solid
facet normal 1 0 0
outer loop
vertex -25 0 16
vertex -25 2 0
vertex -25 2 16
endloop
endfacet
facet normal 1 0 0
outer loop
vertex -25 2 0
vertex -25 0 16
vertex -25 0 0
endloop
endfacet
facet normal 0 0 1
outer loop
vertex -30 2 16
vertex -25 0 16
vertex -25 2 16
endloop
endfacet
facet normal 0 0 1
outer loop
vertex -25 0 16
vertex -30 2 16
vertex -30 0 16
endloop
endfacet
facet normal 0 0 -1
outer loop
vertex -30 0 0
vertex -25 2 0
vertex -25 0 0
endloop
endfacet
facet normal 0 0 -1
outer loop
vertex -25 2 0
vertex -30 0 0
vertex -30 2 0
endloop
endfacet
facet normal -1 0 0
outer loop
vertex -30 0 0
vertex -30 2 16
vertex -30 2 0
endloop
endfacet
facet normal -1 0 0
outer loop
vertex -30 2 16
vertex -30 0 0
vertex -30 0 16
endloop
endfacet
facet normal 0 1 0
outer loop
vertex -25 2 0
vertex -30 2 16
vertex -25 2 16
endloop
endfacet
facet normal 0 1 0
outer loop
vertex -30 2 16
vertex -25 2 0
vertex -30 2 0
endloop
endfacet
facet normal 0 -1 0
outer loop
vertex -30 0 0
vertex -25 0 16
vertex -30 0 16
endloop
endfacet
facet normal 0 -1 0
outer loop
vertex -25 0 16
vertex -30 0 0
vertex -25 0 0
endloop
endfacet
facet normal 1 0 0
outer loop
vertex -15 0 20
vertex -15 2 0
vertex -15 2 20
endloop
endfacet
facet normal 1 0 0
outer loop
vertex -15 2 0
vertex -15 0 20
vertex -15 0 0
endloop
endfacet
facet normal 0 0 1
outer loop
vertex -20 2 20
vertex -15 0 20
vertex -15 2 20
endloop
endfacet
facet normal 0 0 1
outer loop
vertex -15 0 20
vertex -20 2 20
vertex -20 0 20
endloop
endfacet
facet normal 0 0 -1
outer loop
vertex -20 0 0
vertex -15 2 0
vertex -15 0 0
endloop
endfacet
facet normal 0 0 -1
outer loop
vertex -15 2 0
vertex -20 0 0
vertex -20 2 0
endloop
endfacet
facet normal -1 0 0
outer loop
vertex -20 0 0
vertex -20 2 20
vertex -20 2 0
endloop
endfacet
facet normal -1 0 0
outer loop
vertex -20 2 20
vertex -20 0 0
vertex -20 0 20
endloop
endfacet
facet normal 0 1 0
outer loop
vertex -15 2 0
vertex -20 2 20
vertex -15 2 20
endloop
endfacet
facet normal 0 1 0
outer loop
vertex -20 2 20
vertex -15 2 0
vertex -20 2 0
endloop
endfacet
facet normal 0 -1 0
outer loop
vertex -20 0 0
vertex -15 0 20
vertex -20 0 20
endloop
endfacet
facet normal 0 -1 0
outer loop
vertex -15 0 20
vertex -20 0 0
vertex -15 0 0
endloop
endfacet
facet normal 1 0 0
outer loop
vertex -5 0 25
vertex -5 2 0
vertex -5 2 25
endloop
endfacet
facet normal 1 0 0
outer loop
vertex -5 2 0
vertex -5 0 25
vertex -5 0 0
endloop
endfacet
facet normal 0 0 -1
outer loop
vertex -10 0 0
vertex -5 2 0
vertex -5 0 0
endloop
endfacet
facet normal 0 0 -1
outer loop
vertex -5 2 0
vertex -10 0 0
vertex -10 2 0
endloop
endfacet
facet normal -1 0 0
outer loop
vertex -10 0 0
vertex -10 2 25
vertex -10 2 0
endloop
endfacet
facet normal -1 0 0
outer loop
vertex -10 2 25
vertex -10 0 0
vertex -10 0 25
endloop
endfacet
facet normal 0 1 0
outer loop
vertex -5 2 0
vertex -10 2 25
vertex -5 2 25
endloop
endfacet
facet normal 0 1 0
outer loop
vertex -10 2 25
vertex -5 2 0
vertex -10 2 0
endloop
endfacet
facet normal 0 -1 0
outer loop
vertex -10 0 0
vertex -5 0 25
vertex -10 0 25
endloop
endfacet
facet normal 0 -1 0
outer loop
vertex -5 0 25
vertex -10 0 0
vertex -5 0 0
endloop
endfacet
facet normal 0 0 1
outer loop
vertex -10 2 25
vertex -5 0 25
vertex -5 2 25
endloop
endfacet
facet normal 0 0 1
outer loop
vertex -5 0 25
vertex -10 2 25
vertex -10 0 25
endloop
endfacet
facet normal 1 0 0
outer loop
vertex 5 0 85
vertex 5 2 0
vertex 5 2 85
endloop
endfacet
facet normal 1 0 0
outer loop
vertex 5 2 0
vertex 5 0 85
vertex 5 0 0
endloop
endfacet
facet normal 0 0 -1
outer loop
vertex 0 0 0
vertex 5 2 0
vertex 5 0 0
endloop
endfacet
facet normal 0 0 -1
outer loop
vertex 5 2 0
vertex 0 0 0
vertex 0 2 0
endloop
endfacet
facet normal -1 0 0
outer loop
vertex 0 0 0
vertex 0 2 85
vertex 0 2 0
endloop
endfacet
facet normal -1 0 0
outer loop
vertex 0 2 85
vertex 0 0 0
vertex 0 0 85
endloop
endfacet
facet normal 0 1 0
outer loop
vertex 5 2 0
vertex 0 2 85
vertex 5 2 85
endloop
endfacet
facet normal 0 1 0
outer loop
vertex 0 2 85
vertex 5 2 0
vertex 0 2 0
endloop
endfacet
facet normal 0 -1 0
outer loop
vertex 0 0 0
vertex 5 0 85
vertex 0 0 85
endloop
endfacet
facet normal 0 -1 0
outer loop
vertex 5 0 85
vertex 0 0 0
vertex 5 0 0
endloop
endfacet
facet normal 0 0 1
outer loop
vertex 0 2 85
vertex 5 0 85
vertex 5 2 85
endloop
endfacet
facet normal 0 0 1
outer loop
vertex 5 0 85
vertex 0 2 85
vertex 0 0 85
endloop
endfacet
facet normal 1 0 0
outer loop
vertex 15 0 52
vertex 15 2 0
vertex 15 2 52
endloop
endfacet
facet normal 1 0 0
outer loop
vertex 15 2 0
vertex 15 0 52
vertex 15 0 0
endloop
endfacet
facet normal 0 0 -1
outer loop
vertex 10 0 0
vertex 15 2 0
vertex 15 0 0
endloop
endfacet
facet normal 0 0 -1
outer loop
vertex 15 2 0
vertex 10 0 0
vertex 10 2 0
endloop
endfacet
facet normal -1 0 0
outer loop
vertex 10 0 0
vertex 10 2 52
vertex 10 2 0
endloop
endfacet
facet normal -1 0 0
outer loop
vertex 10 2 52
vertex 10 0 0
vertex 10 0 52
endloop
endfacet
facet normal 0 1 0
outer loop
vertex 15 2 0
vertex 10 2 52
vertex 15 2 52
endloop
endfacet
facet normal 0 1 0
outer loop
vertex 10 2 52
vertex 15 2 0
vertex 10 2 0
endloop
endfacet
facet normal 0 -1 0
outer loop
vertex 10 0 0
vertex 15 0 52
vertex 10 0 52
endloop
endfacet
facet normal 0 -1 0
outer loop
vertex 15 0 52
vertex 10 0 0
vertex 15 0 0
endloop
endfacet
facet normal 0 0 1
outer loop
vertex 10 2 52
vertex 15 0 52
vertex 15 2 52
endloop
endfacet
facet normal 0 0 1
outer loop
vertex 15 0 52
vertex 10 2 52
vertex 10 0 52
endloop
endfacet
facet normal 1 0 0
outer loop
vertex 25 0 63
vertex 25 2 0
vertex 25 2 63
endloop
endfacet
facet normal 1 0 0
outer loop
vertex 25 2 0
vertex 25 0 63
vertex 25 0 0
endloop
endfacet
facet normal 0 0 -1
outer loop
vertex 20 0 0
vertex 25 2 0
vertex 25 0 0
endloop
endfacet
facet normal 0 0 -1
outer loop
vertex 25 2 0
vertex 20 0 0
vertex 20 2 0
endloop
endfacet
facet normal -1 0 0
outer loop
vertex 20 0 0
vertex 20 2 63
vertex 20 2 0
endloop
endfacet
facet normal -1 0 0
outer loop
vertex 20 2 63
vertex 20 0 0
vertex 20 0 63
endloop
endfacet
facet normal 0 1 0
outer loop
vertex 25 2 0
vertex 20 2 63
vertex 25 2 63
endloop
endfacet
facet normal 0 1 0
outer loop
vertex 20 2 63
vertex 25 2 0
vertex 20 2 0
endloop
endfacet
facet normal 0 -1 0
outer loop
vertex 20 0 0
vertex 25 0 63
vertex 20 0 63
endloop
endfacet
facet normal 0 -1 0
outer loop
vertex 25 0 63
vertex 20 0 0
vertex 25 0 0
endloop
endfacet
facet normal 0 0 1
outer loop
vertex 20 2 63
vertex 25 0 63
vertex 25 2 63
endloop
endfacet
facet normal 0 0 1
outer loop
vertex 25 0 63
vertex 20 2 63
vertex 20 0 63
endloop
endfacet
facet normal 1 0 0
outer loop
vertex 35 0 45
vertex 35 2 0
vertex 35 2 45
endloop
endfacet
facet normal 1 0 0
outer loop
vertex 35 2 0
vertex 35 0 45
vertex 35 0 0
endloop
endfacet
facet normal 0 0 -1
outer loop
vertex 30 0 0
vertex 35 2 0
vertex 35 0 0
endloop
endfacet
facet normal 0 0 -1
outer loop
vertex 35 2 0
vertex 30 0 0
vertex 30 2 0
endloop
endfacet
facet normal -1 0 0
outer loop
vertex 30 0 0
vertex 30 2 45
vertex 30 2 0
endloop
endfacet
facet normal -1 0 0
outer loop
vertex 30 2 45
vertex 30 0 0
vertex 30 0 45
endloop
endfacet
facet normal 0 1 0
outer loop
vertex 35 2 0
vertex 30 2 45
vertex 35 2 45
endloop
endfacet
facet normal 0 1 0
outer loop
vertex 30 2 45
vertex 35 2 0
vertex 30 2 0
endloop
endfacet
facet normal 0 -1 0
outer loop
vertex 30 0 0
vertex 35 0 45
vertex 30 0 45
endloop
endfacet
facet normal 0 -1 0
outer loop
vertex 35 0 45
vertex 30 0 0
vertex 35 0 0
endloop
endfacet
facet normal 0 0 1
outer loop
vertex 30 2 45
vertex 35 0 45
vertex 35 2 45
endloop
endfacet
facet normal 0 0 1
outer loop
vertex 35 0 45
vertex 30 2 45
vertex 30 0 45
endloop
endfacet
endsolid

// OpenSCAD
translate([-30,0,0]) ShowColorBars(Expense);

ColorBreak=[[0, ""], 
            [20, "lime"],
            [40, "greenyellow"],
            [60, "yellow"],
            [75, "lightcoral"],
            [200, "red"]];
            
Expense=[16,20,25,85,52,63,45];

module ColorBar(value,period,range){
    RangeHi = ColorBreak[range][0];
    RangeLo = ColorBreak[range-1][0];
    color(ColorBreak[range][1]);
    translate([10*period,0,RangeLo])
        if (value > RangeHi) cube([5,2,RangeHi-RangeLo]);
        else if (value > RangeLo) cube([5,2,value-RangeLo]);
    }

module ShowColorBars(values) {
    for (month = [0:len(values)-1], range = [1:len(ColorBreak)-1])
        ColorBar(values[month],month,range);
    }
